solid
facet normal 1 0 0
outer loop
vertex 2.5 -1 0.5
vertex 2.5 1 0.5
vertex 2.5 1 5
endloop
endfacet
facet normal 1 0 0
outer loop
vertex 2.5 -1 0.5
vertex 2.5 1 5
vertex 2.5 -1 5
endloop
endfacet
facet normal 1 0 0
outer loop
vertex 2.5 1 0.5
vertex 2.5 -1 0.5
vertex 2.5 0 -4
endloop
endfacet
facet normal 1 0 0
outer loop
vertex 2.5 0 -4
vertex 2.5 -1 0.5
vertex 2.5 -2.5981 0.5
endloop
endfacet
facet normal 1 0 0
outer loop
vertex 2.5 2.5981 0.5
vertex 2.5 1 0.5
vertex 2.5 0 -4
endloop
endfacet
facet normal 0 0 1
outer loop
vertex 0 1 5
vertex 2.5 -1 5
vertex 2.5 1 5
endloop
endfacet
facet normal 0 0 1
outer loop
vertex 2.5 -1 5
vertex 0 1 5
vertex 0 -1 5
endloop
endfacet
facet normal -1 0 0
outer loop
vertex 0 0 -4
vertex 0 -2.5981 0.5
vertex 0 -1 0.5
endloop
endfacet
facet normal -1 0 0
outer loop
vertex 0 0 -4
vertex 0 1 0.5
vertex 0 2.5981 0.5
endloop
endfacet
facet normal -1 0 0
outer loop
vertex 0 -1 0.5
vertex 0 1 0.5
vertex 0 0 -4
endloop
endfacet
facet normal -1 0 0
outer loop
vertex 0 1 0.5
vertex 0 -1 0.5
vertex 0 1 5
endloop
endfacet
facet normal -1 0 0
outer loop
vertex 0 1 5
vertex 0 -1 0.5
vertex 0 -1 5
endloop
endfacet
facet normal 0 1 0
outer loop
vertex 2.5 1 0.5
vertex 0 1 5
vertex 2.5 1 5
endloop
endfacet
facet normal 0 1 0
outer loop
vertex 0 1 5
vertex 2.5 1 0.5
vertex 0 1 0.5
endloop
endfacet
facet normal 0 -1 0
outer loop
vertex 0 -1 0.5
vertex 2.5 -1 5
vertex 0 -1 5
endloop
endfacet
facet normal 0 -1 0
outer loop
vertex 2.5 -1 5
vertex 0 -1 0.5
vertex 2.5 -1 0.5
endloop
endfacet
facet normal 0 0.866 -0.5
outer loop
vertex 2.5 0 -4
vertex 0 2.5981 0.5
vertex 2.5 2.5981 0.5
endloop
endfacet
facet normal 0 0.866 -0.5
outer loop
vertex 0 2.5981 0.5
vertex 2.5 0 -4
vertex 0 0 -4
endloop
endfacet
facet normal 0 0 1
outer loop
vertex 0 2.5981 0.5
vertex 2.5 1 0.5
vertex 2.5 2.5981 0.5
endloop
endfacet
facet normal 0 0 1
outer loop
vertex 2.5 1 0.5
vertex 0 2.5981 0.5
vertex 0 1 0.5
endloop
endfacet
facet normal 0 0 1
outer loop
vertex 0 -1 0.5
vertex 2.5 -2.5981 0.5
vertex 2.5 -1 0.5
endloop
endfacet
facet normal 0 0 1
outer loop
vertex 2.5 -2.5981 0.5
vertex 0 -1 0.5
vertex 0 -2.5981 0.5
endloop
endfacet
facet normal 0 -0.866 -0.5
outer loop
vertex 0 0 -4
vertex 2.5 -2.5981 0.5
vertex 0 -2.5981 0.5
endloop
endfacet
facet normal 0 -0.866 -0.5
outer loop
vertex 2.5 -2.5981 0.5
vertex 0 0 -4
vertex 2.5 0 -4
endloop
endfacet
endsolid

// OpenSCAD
module arrow(){
	//arrowBody
	translate([0,-1,0]) color([0,1,1]) cube(size=[2.5,2,5]);
	//arrowHead
	translate([0,0,-1]) color([0,1,1]) rotate([0,90,0]) cylinder(h=2.5,r=3,$fn=3);
}

arrow();
